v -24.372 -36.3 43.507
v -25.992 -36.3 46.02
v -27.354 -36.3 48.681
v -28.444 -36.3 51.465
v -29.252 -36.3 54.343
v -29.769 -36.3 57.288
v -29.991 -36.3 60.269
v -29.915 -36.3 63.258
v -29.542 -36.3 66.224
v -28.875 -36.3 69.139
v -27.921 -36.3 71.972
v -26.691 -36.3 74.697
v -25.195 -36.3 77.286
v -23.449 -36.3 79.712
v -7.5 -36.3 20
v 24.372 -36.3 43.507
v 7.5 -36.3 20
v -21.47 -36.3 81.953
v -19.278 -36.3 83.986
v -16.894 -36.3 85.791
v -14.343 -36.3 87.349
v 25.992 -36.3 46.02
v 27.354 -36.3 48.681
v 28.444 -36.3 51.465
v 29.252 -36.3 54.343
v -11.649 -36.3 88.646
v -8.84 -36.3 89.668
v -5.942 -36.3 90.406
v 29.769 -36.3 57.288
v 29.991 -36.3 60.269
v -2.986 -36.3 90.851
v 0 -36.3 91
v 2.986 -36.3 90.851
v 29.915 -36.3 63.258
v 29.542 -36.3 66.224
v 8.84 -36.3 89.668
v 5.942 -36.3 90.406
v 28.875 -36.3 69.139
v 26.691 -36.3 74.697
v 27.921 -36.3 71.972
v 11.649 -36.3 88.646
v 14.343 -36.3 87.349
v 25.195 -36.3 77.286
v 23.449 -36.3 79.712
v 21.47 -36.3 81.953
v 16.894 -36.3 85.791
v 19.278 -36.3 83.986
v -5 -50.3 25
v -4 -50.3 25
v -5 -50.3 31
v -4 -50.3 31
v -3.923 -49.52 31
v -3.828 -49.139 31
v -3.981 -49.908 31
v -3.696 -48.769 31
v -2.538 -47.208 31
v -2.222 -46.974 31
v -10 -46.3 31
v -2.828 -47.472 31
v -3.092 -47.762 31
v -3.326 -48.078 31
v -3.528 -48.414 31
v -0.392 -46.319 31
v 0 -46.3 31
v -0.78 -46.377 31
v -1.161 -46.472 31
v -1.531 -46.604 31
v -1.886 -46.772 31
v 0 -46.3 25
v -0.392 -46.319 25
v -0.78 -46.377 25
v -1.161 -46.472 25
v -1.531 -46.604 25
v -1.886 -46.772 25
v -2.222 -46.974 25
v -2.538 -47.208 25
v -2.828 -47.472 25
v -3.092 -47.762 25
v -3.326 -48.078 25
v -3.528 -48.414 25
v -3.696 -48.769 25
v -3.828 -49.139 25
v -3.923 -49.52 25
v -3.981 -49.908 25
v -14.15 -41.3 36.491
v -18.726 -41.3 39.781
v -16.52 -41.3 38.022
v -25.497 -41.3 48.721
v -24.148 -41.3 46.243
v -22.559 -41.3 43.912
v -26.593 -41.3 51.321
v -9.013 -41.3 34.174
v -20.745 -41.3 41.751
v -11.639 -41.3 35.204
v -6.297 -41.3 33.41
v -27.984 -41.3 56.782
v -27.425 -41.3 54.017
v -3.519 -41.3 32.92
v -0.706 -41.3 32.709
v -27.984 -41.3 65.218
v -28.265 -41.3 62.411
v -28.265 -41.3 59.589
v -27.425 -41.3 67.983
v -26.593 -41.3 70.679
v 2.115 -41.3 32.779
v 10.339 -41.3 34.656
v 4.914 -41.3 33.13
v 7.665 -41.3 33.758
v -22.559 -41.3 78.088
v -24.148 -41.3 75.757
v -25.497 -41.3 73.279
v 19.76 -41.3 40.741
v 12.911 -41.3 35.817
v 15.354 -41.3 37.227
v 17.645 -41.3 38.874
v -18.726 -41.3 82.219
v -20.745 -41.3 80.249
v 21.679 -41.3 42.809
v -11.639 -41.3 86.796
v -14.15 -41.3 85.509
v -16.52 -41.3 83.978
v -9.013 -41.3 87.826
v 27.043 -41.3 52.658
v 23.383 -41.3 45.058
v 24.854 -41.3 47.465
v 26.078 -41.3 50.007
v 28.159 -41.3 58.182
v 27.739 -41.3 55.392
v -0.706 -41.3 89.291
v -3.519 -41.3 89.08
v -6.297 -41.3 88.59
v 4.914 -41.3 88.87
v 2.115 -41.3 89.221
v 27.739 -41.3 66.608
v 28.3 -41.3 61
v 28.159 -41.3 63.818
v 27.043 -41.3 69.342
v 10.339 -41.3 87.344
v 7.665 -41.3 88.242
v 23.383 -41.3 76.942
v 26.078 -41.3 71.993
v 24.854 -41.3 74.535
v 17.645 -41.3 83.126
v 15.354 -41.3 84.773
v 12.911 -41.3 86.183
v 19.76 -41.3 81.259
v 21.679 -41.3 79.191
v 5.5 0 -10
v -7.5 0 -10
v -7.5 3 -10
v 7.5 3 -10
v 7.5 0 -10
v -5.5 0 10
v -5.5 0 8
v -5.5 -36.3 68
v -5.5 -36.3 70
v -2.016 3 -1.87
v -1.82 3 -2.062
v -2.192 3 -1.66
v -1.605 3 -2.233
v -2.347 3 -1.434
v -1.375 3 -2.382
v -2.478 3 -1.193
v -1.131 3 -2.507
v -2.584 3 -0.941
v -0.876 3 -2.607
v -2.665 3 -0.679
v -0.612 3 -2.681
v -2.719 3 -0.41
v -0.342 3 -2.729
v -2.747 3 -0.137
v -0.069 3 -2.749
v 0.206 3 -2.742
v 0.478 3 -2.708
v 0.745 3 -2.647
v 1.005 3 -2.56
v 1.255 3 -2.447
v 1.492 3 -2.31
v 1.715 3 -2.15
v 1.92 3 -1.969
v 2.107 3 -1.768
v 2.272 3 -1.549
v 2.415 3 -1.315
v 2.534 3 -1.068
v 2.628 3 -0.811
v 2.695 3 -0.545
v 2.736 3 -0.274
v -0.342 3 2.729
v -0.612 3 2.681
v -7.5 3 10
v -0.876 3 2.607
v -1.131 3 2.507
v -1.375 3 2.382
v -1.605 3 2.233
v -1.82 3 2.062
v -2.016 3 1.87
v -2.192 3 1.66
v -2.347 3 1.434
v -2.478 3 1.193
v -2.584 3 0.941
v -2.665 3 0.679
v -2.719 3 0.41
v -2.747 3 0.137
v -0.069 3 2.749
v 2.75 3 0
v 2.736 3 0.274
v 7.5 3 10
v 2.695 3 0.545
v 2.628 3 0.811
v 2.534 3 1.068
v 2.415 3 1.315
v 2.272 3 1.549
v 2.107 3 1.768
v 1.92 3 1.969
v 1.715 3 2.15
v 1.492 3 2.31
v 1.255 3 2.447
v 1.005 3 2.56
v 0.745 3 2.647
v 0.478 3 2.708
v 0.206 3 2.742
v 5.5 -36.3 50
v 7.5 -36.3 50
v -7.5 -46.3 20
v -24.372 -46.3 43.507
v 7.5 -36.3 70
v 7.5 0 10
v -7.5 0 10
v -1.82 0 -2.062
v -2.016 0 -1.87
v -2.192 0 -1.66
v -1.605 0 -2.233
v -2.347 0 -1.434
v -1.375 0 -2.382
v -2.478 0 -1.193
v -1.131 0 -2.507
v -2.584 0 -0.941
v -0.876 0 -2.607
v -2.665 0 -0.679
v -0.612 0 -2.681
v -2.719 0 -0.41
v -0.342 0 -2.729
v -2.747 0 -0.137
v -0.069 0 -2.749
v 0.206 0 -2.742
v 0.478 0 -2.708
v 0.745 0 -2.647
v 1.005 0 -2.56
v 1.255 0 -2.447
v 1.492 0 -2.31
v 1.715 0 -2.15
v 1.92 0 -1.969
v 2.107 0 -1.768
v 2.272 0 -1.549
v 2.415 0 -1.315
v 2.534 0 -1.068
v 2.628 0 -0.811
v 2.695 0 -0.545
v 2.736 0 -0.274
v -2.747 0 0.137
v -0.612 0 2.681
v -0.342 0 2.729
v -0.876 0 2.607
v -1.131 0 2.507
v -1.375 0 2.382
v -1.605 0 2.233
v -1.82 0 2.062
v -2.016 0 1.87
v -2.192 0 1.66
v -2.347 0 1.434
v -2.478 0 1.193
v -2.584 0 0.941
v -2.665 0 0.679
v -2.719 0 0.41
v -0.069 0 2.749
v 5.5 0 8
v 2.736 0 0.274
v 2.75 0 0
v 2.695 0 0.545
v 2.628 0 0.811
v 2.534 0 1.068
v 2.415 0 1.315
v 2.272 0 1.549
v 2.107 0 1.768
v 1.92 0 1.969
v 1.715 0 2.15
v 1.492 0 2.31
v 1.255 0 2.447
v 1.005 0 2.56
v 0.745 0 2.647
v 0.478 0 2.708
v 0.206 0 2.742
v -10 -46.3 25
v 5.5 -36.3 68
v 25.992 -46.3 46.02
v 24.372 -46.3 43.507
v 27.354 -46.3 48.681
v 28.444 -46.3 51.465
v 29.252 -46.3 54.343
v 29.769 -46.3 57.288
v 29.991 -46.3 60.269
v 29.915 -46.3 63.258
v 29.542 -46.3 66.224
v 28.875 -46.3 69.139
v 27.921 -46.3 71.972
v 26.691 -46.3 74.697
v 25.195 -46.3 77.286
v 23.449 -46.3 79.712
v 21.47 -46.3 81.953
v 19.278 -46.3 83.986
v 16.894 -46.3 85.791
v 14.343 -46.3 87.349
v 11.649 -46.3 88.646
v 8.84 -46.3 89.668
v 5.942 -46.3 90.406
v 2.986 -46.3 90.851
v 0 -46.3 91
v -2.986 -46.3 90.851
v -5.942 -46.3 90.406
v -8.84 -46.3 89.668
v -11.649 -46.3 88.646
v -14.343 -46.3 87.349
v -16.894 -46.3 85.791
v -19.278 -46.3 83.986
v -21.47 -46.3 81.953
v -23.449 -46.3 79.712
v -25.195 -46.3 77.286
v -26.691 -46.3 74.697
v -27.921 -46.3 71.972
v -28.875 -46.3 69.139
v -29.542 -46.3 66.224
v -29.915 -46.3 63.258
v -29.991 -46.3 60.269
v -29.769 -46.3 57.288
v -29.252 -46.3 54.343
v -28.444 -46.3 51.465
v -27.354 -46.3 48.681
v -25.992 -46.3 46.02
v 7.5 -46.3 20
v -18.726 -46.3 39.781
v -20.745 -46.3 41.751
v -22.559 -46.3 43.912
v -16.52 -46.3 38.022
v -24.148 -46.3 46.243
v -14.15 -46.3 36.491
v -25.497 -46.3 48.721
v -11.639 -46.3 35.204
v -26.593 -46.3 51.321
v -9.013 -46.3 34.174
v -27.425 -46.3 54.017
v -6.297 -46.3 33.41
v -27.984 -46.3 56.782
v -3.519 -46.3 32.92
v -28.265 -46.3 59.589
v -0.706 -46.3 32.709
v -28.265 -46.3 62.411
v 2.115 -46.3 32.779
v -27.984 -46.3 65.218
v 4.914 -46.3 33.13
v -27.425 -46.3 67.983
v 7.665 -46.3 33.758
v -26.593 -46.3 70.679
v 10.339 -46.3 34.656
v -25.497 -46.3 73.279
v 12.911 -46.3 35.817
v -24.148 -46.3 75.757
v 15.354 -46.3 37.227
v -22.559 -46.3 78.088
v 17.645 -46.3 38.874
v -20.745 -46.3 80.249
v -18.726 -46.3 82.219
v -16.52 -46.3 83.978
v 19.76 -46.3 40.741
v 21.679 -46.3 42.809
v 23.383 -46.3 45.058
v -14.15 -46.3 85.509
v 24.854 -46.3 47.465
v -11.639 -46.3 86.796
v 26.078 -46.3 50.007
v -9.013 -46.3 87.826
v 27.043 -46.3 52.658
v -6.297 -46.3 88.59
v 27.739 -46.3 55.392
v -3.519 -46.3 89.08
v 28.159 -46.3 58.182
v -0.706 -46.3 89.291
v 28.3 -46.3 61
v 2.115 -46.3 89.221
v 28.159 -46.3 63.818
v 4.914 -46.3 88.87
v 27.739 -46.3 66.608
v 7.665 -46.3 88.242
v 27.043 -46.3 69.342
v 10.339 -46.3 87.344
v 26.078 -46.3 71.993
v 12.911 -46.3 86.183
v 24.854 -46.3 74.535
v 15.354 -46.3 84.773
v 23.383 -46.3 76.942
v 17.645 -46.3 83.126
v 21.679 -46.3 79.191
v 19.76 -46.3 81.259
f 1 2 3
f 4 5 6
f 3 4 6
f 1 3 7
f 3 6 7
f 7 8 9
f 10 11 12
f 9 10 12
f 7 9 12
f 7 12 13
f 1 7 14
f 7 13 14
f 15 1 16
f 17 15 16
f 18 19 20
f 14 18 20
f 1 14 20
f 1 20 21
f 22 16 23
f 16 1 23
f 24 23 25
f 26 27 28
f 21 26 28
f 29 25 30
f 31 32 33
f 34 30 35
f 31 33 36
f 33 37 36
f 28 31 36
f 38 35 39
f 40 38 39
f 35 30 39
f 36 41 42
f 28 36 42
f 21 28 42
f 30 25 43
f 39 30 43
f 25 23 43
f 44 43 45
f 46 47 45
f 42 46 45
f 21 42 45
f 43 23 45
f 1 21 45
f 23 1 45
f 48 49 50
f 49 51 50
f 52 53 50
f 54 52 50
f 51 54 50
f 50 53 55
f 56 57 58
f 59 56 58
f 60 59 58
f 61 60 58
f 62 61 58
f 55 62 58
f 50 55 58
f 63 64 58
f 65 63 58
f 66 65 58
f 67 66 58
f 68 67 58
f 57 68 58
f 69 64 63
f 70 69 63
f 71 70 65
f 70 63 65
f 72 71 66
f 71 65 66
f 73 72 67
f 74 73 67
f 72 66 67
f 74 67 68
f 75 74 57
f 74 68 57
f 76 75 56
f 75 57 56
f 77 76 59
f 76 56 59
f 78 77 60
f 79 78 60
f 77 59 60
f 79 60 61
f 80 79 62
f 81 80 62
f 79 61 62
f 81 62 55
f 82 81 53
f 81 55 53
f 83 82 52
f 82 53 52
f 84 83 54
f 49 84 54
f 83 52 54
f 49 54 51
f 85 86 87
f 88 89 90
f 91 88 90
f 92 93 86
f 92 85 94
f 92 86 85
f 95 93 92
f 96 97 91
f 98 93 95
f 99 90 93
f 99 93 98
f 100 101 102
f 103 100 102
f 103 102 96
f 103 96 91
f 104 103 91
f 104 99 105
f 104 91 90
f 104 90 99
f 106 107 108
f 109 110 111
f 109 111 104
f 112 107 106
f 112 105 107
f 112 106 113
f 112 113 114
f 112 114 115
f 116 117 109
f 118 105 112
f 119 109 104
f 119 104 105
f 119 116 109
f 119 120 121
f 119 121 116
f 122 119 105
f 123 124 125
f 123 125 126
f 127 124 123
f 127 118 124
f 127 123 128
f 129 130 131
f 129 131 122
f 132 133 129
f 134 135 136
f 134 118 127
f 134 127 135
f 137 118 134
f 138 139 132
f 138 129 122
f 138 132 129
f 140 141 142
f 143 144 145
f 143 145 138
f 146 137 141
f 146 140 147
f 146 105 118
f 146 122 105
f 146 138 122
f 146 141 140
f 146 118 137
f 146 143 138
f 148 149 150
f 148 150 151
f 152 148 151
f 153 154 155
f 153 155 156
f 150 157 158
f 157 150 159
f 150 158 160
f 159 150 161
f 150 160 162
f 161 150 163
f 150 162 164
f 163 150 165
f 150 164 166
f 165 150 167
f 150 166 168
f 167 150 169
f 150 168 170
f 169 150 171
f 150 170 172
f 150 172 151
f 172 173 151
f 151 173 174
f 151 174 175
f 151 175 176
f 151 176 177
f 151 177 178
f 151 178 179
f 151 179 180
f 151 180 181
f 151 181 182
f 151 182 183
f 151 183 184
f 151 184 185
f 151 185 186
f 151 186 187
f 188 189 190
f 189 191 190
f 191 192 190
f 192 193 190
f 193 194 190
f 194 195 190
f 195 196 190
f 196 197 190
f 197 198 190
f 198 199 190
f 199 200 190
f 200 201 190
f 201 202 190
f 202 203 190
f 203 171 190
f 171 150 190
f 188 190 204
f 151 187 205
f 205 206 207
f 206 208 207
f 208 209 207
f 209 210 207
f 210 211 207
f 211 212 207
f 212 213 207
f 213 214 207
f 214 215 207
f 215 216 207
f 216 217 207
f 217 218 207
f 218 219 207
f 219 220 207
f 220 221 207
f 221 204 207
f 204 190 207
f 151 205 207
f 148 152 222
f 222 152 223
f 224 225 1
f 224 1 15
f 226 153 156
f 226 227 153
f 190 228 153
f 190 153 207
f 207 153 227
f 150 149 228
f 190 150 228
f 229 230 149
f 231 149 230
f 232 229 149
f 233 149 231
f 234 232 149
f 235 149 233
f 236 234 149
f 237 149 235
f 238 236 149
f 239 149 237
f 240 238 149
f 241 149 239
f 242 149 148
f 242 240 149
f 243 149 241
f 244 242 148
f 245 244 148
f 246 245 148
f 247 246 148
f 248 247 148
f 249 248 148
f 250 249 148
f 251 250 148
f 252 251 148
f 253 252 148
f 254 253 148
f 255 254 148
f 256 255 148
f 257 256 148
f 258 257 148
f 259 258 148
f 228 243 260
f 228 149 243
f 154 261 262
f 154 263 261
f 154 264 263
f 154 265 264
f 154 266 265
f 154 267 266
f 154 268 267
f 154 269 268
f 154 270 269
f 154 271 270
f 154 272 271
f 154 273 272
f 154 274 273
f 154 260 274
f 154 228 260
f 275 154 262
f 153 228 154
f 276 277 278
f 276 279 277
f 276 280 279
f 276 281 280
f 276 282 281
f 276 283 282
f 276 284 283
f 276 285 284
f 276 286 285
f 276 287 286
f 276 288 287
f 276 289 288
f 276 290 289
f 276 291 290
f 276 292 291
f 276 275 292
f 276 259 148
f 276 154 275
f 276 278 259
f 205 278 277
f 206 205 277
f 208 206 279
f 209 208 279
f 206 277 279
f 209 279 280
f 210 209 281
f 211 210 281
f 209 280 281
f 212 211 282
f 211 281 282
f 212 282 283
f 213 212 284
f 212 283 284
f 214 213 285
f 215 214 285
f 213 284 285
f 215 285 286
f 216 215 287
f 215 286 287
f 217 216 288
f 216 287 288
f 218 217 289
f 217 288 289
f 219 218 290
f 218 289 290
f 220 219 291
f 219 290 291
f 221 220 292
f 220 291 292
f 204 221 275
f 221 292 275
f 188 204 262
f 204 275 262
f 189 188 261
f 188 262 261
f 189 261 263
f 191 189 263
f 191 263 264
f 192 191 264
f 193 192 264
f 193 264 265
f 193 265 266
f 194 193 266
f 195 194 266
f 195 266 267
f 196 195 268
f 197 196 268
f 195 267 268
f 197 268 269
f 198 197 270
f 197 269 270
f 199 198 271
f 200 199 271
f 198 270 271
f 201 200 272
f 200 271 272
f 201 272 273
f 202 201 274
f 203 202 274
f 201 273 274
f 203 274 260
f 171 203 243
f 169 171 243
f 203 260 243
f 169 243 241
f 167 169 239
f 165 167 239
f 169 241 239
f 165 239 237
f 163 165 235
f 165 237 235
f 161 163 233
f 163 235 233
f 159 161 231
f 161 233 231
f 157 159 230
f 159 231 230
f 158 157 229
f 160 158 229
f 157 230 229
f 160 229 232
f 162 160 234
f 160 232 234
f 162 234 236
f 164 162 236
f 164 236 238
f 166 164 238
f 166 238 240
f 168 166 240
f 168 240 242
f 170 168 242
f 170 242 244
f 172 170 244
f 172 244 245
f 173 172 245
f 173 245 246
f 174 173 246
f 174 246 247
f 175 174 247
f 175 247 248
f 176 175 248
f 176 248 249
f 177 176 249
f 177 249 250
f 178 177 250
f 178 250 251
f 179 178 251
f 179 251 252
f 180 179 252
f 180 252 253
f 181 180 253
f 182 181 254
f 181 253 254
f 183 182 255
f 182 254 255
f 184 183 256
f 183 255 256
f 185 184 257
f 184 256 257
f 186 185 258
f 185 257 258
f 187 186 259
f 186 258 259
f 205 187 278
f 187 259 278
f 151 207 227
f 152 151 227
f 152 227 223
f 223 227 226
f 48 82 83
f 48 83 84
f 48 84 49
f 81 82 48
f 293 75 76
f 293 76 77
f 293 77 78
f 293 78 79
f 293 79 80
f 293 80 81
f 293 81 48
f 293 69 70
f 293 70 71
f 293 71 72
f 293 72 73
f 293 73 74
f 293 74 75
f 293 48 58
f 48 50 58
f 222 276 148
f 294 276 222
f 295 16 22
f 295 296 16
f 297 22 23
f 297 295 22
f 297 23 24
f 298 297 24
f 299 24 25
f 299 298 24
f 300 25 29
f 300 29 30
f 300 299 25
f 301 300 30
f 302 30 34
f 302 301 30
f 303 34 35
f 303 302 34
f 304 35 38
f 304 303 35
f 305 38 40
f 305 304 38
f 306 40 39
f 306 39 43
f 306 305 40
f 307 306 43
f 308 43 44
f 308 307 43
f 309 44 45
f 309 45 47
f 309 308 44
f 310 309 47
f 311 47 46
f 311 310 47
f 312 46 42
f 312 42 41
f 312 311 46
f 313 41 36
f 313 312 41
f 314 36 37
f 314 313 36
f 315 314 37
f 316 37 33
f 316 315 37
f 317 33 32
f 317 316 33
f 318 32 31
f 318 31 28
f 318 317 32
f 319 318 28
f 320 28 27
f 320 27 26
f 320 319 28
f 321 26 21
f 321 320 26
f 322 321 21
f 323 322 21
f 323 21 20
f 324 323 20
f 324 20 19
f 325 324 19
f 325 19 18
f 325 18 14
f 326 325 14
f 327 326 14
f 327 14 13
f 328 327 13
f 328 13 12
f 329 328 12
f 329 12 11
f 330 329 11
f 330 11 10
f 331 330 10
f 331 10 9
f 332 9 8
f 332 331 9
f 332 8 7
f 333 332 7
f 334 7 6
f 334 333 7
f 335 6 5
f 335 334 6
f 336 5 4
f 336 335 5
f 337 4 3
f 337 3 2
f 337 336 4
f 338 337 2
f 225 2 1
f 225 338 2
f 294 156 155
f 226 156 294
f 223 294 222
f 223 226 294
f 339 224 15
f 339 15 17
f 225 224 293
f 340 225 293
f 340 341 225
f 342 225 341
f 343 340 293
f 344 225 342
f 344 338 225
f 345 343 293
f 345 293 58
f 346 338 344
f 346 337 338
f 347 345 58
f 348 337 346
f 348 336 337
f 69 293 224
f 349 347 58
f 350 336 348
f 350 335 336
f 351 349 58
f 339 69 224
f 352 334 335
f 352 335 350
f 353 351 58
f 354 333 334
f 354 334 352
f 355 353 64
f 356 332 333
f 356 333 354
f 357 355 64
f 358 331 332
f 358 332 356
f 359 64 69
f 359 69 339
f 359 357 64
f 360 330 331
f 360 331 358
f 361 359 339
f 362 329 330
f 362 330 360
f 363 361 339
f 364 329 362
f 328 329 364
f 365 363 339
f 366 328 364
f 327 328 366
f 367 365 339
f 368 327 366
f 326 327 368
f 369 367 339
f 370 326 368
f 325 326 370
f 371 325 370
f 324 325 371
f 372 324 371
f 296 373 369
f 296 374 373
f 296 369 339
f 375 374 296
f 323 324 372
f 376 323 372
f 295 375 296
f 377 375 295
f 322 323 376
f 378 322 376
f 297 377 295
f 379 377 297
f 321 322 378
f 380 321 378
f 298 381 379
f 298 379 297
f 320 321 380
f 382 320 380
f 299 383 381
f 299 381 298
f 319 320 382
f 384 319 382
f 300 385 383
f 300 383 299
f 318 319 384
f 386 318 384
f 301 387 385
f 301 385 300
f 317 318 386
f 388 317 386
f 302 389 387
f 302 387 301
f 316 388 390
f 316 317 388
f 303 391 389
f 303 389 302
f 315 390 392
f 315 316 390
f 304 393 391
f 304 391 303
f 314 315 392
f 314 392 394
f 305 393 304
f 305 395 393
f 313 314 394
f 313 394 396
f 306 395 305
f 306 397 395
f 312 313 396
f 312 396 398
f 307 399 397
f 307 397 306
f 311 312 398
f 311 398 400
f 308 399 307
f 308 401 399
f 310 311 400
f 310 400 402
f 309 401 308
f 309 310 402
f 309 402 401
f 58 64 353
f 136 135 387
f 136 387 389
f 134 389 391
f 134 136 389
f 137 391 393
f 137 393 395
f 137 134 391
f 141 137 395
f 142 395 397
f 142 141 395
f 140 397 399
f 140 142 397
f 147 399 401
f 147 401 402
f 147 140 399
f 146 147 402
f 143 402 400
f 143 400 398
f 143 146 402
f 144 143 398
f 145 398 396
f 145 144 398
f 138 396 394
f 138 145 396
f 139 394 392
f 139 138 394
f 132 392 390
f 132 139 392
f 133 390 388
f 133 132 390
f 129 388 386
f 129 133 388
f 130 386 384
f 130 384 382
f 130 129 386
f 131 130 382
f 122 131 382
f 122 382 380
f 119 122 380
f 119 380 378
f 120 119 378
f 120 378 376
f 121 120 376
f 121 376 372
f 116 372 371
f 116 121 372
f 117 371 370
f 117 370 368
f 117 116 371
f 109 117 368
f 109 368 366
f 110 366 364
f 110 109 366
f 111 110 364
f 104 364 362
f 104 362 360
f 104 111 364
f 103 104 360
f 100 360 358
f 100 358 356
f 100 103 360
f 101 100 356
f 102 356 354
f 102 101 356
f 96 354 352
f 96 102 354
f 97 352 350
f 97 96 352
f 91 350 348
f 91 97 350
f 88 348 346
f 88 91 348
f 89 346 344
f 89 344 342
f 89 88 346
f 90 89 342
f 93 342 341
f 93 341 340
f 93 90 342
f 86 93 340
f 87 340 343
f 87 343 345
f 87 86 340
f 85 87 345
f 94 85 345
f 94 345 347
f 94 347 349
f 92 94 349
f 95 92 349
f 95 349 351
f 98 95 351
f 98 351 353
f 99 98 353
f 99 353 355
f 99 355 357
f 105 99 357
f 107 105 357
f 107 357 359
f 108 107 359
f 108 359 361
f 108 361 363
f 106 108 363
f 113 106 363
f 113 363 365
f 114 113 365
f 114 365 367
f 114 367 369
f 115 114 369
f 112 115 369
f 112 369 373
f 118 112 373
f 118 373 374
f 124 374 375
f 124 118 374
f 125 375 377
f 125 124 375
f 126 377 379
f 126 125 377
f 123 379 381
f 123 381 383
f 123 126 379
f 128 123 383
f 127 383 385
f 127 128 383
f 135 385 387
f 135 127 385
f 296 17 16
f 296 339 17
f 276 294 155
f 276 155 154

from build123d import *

# Parameters (mm, degrees)
PAD007_DEPTH = 5
SKETCH004_R  = 28.3
POCKET_DEPTH = 5
PAD008_DEPTH = 3
SKETCH_W     = 15
SKETCH_H     = 20
SKETCH_R     = 2.75
PAD_DEPTH    = 3
PAD005_DEPTH = 2
PAD006_DEPTH = 5.5


with BuildPart() as body:
    # Sketch003 (on DatumPlane) → Pad007 (new body, symmetric)
    with BuildSketch(Plane.XZ.offset(41.3)):
        with BuildLine():
            ThreePointArc((24.372074, 43.507087), (0, 91), (-24.372074, 43.507087))
            Line((-24.372074, 43.507087), (-7.5, 20))
            Line((-7.5, 20), (7.5, 20))
            Line((7.5, 20), (24.372074, 43.507087))
        make_face()
    extrude(amount=PAD007_DEPTH, both=True)

    # Sketch004 (on DatumPlane) → Pocket (cut)
    with BuildSketch(Plane.XZ.offset(41.3)):
        with Locations((0, 61)):
            Circle(SKETCH004_R)
    extrude(amount=POCKET_DEPTH, mode=Mode.SUBTRACT)

    # Sketch005 (on DatumPlane) → Pad008 (join, symmetric)
    with BuildSketch(Plane.XY.offset(28)):
        with BuildLine():
            ThreePointArc((0, -46.3), (-2.828427, -47.471573), (-4, -50.3))
            Line((-4, -50.3), (-5, -50.3))
            Line((-5, -50.3), (-10, -46.3))
            Line((-10, -46.3), (0, -46.3))
        make_face()
    extrude(amount=PAD008_DEPTH, both=True)


with BuildPart() as body001:
    # Sketch → Pad (new body)
    with BuildSketch(Plane.XZ):
        Rectangle(SKETCH_W, SKETCH_H)
        Circle(SKETCH_R, mode=Mode.SUBTRACT)
    extrude(amount=-PAD_DEPTH)

    # Sketch001 (on DatumPlane) → Pad005 (join)
    with BuildSketch(Plane.YZ.offset(7.5)):
        Polygon((0, -10), (-36.3, 50), (-36.3, 70), (0, 10), align=None)
    extrude(amount=-PAD005_DEPTH)

    # Sketch002 → Pad006 (join, symmetric)
    with BuildSketch(Plane.YZ):
        Polygon((0, 10), (-36.3, 70), (-36.3, 68), (0, 8), align=None)
    extrude(amount=PAD006_DEPTH, both=True)


solid = Compound([body.part, body001.part])
